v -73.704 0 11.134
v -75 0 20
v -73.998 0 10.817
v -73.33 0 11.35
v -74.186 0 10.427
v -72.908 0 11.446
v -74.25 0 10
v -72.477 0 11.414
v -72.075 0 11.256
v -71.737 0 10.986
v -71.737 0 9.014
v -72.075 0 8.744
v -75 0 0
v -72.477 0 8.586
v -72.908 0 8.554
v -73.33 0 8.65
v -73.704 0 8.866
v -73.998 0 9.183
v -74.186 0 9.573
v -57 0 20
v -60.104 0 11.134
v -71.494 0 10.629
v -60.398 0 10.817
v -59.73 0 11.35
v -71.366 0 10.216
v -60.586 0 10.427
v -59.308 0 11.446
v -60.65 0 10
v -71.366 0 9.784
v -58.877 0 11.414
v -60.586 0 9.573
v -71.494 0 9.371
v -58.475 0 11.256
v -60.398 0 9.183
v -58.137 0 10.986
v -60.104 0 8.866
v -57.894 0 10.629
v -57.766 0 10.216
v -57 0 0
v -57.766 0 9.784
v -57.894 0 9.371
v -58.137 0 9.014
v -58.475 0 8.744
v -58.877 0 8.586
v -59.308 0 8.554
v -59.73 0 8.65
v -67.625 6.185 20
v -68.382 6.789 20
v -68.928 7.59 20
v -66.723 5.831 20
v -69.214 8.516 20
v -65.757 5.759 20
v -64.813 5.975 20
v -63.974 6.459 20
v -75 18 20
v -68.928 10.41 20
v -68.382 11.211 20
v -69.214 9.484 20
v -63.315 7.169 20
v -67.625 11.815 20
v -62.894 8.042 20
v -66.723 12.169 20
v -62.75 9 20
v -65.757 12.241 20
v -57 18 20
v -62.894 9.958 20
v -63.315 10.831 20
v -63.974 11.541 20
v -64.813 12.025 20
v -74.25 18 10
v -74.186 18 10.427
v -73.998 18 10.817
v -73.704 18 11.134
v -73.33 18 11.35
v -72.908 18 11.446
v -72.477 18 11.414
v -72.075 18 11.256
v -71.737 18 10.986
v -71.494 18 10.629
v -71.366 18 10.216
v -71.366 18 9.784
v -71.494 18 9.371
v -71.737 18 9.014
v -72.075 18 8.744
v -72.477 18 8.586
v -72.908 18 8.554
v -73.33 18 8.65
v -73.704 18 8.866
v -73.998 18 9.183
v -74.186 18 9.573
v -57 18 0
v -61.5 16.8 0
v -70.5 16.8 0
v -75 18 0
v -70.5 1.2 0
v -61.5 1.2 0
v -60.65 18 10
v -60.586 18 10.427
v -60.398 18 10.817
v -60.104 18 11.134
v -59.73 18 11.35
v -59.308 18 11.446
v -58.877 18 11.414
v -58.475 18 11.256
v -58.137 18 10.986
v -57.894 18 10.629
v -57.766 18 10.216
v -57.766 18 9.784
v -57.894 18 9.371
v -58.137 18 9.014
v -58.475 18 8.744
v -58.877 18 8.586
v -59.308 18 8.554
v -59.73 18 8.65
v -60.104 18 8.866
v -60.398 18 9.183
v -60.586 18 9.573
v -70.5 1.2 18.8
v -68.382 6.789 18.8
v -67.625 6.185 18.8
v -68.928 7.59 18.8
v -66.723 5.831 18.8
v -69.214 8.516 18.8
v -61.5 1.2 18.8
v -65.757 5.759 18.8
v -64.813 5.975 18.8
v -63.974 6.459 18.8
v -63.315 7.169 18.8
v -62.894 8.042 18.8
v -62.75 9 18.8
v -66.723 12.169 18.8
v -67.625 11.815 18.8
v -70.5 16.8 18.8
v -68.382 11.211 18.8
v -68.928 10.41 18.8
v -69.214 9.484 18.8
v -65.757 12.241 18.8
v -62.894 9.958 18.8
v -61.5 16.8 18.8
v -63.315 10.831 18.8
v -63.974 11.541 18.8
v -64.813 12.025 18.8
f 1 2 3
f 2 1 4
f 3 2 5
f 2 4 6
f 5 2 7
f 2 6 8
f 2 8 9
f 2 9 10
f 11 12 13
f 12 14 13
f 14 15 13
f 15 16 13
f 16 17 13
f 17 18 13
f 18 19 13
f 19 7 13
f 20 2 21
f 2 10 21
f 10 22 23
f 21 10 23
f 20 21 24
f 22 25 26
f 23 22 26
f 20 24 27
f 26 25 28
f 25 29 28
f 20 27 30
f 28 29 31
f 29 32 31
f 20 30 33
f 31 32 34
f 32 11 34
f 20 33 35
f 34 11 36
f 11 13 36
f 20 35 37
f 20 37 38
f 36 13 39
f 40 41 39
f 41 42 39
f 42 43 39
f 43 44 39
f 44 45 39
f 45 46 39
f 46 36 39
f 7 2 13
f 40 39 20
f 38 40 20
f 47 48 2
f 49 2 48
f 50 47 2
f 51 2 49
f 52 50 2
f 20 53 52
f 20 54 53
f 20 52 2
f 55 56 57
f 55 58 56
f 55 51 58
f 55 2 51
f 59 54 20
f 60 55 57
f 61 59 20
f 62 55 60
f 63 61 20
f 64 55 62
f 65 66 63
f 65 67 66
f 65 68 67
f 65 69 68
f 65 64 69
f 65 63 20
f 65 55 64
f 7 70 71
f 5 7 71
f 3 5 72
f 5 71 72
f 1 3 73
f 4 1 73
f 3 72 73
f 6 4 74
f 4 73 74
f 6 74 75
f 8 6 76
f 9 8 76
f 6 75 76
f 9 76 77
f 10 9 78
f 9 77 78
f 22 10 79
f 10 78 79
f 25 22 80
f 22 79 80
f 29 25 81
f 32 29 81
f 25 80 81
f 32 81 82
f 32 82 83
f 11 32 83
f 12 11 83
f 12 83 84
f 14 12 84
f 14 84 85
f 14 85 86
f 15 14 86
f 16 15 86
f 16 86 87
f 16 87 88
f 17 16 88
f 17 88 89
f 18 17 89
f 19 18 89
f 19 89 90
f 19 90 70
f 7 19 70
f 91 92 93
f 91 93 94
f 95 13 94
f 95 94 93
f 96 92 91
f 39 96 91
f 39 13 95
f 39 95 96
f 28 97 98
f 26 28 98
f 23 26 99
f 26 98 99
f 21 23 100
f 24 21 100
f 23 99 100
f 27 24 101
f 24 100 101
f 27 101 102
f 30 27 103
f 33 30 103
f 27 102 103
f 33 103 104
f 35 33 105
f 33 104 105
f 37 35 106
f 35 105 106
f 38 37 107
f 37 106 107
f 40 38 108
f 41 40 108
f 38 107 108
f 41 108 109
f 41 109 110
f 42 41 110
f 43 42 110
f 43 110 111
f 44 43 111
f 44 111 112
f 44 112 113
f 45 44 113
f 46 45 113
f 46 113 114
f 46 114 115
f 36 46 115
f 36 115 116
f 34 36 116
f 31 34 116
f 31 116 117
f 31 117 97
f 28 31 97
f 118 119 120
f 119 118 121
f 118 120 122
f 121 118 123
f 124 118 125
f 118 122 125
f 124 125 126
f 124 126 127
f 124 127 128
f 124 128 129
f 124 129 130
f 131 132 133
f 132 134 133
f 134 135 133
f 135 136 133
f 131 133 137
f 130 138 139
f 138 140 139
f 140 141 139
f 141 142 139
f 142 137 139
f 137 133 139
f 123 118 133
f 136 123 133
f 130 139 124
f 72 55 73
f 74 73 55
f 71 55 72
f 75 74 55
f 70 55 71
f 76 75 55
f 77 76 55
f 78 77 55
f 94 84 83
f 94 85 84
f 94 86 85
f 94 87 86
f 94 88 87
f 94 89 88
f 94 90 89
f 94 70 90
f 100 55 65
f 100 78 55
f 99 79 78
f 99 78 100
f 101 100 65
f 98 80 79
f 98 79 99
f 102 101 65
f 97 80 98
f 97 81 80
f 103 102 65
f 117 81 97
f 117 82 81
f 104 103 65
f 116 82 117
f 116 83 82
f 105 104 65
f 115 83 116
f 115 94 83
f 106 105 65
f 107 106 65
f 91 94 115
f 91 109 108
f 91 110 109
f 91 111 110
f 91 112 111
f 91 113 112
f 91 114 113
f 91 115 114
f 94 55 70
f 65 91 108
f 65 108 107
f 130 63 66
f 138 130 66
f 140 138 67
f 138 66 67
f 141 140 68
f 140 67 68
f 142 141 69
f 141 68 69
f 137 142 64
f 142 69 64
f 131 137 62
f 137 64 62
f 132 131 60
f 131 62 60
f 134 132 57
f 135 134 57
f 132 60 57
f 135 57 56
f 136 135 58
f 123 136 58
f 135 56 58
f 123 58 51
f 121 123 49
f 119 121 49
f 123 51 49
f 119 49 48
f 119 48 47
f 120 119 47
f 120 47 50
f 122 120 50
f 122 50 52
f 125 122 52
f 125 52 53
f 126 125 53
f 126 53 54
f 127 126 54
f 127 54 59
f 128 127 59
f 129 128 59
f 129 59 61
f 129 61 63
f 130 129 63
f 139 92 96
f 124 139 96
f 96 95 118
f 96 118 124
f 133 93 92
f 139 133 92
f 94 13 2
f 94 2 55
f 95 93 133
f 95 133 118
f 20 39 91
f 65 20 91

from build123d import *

# Parameters (mm, degrees)
SKETCH007_W     = 18
SKETCH007_H     = 18
PAD007_DEPTH    = 20
THICKNESS002_T  = -1.2
SKETCH008_R     = 3.25
POCKET002_DEPTH = 5
SKETCH009_W     = 3.3
SKETCH009_H     = 15.6
PAD008_DEPTH    = 18.8
SKETCH010_R     = 1.45
POCKET003_DEPTH = 18.001


with BuildPart() as part:
    # Sketch007 → Pad007 (new body)
    with BuildSketch(Plane.XY):
        with Locations((9, 9)):
            Rectangle(SKETCH007_W, SKETCH007_H)
    extrude(amount=PAD007_DEPTH)

    # Thickness002
    thickness002_openings = [part.faces().sort_by_distance(p)[0] for p in [
        (9, 9, 0),
    ]]
    offset(amount=THICKNESS002_T, openings=thickness002_openings, kind=Kind.INTERSECTION)

    # Sketch008 (on Face5 of Thickness002) → Pocket002 (cut)
    with BuildSketch(Plane.XY.offset(20)):
        with Locations((9, 9)):
            Circle(SKETCH008_R)
    extrude(amount=-POCKET002_DEPTH, mode=Mode.SUBTRACT)

    # Sketch009 (on Face4 of Pocket002) → Pad008 (join)
    with BuildSketch(Plane(origin=(0, 0, 0), x_dir=(1, 0, 0), z_dir=(0, 0, -1))):
        with Locations((2.85, -9)):
            Rectangle(SKETCH009_W, SKETCH009_H)
        with Locations((15.15, -9)):
            Rectangle(SKETCH009_W, SKETCH009_H)
    extrude(amount=-PAD008_DEPTH)

    # Sketch010 (on Face6 of Pad008) → Pocket003 (cut, through all)
    with BuildSketch(Plane(origin=(0, 18, 0), x_dir=(-1, 0, 0), z_dir=(0, 1, 0))):
        with Locations((-15.8, 10)):
            Circle(SKETCH010_R)
        with Locations((-2.2, 10)):
            Circle(SKETCH010_R)
    extrude(amount=-POCKET003_DEPTH, mode=Mode.SUBTRACT)


with BuildPart() as part_1:
    # Body003 placement: moved
    add(part.part.moved(Location((-75, 0, 0))))


solid = part_1.part
